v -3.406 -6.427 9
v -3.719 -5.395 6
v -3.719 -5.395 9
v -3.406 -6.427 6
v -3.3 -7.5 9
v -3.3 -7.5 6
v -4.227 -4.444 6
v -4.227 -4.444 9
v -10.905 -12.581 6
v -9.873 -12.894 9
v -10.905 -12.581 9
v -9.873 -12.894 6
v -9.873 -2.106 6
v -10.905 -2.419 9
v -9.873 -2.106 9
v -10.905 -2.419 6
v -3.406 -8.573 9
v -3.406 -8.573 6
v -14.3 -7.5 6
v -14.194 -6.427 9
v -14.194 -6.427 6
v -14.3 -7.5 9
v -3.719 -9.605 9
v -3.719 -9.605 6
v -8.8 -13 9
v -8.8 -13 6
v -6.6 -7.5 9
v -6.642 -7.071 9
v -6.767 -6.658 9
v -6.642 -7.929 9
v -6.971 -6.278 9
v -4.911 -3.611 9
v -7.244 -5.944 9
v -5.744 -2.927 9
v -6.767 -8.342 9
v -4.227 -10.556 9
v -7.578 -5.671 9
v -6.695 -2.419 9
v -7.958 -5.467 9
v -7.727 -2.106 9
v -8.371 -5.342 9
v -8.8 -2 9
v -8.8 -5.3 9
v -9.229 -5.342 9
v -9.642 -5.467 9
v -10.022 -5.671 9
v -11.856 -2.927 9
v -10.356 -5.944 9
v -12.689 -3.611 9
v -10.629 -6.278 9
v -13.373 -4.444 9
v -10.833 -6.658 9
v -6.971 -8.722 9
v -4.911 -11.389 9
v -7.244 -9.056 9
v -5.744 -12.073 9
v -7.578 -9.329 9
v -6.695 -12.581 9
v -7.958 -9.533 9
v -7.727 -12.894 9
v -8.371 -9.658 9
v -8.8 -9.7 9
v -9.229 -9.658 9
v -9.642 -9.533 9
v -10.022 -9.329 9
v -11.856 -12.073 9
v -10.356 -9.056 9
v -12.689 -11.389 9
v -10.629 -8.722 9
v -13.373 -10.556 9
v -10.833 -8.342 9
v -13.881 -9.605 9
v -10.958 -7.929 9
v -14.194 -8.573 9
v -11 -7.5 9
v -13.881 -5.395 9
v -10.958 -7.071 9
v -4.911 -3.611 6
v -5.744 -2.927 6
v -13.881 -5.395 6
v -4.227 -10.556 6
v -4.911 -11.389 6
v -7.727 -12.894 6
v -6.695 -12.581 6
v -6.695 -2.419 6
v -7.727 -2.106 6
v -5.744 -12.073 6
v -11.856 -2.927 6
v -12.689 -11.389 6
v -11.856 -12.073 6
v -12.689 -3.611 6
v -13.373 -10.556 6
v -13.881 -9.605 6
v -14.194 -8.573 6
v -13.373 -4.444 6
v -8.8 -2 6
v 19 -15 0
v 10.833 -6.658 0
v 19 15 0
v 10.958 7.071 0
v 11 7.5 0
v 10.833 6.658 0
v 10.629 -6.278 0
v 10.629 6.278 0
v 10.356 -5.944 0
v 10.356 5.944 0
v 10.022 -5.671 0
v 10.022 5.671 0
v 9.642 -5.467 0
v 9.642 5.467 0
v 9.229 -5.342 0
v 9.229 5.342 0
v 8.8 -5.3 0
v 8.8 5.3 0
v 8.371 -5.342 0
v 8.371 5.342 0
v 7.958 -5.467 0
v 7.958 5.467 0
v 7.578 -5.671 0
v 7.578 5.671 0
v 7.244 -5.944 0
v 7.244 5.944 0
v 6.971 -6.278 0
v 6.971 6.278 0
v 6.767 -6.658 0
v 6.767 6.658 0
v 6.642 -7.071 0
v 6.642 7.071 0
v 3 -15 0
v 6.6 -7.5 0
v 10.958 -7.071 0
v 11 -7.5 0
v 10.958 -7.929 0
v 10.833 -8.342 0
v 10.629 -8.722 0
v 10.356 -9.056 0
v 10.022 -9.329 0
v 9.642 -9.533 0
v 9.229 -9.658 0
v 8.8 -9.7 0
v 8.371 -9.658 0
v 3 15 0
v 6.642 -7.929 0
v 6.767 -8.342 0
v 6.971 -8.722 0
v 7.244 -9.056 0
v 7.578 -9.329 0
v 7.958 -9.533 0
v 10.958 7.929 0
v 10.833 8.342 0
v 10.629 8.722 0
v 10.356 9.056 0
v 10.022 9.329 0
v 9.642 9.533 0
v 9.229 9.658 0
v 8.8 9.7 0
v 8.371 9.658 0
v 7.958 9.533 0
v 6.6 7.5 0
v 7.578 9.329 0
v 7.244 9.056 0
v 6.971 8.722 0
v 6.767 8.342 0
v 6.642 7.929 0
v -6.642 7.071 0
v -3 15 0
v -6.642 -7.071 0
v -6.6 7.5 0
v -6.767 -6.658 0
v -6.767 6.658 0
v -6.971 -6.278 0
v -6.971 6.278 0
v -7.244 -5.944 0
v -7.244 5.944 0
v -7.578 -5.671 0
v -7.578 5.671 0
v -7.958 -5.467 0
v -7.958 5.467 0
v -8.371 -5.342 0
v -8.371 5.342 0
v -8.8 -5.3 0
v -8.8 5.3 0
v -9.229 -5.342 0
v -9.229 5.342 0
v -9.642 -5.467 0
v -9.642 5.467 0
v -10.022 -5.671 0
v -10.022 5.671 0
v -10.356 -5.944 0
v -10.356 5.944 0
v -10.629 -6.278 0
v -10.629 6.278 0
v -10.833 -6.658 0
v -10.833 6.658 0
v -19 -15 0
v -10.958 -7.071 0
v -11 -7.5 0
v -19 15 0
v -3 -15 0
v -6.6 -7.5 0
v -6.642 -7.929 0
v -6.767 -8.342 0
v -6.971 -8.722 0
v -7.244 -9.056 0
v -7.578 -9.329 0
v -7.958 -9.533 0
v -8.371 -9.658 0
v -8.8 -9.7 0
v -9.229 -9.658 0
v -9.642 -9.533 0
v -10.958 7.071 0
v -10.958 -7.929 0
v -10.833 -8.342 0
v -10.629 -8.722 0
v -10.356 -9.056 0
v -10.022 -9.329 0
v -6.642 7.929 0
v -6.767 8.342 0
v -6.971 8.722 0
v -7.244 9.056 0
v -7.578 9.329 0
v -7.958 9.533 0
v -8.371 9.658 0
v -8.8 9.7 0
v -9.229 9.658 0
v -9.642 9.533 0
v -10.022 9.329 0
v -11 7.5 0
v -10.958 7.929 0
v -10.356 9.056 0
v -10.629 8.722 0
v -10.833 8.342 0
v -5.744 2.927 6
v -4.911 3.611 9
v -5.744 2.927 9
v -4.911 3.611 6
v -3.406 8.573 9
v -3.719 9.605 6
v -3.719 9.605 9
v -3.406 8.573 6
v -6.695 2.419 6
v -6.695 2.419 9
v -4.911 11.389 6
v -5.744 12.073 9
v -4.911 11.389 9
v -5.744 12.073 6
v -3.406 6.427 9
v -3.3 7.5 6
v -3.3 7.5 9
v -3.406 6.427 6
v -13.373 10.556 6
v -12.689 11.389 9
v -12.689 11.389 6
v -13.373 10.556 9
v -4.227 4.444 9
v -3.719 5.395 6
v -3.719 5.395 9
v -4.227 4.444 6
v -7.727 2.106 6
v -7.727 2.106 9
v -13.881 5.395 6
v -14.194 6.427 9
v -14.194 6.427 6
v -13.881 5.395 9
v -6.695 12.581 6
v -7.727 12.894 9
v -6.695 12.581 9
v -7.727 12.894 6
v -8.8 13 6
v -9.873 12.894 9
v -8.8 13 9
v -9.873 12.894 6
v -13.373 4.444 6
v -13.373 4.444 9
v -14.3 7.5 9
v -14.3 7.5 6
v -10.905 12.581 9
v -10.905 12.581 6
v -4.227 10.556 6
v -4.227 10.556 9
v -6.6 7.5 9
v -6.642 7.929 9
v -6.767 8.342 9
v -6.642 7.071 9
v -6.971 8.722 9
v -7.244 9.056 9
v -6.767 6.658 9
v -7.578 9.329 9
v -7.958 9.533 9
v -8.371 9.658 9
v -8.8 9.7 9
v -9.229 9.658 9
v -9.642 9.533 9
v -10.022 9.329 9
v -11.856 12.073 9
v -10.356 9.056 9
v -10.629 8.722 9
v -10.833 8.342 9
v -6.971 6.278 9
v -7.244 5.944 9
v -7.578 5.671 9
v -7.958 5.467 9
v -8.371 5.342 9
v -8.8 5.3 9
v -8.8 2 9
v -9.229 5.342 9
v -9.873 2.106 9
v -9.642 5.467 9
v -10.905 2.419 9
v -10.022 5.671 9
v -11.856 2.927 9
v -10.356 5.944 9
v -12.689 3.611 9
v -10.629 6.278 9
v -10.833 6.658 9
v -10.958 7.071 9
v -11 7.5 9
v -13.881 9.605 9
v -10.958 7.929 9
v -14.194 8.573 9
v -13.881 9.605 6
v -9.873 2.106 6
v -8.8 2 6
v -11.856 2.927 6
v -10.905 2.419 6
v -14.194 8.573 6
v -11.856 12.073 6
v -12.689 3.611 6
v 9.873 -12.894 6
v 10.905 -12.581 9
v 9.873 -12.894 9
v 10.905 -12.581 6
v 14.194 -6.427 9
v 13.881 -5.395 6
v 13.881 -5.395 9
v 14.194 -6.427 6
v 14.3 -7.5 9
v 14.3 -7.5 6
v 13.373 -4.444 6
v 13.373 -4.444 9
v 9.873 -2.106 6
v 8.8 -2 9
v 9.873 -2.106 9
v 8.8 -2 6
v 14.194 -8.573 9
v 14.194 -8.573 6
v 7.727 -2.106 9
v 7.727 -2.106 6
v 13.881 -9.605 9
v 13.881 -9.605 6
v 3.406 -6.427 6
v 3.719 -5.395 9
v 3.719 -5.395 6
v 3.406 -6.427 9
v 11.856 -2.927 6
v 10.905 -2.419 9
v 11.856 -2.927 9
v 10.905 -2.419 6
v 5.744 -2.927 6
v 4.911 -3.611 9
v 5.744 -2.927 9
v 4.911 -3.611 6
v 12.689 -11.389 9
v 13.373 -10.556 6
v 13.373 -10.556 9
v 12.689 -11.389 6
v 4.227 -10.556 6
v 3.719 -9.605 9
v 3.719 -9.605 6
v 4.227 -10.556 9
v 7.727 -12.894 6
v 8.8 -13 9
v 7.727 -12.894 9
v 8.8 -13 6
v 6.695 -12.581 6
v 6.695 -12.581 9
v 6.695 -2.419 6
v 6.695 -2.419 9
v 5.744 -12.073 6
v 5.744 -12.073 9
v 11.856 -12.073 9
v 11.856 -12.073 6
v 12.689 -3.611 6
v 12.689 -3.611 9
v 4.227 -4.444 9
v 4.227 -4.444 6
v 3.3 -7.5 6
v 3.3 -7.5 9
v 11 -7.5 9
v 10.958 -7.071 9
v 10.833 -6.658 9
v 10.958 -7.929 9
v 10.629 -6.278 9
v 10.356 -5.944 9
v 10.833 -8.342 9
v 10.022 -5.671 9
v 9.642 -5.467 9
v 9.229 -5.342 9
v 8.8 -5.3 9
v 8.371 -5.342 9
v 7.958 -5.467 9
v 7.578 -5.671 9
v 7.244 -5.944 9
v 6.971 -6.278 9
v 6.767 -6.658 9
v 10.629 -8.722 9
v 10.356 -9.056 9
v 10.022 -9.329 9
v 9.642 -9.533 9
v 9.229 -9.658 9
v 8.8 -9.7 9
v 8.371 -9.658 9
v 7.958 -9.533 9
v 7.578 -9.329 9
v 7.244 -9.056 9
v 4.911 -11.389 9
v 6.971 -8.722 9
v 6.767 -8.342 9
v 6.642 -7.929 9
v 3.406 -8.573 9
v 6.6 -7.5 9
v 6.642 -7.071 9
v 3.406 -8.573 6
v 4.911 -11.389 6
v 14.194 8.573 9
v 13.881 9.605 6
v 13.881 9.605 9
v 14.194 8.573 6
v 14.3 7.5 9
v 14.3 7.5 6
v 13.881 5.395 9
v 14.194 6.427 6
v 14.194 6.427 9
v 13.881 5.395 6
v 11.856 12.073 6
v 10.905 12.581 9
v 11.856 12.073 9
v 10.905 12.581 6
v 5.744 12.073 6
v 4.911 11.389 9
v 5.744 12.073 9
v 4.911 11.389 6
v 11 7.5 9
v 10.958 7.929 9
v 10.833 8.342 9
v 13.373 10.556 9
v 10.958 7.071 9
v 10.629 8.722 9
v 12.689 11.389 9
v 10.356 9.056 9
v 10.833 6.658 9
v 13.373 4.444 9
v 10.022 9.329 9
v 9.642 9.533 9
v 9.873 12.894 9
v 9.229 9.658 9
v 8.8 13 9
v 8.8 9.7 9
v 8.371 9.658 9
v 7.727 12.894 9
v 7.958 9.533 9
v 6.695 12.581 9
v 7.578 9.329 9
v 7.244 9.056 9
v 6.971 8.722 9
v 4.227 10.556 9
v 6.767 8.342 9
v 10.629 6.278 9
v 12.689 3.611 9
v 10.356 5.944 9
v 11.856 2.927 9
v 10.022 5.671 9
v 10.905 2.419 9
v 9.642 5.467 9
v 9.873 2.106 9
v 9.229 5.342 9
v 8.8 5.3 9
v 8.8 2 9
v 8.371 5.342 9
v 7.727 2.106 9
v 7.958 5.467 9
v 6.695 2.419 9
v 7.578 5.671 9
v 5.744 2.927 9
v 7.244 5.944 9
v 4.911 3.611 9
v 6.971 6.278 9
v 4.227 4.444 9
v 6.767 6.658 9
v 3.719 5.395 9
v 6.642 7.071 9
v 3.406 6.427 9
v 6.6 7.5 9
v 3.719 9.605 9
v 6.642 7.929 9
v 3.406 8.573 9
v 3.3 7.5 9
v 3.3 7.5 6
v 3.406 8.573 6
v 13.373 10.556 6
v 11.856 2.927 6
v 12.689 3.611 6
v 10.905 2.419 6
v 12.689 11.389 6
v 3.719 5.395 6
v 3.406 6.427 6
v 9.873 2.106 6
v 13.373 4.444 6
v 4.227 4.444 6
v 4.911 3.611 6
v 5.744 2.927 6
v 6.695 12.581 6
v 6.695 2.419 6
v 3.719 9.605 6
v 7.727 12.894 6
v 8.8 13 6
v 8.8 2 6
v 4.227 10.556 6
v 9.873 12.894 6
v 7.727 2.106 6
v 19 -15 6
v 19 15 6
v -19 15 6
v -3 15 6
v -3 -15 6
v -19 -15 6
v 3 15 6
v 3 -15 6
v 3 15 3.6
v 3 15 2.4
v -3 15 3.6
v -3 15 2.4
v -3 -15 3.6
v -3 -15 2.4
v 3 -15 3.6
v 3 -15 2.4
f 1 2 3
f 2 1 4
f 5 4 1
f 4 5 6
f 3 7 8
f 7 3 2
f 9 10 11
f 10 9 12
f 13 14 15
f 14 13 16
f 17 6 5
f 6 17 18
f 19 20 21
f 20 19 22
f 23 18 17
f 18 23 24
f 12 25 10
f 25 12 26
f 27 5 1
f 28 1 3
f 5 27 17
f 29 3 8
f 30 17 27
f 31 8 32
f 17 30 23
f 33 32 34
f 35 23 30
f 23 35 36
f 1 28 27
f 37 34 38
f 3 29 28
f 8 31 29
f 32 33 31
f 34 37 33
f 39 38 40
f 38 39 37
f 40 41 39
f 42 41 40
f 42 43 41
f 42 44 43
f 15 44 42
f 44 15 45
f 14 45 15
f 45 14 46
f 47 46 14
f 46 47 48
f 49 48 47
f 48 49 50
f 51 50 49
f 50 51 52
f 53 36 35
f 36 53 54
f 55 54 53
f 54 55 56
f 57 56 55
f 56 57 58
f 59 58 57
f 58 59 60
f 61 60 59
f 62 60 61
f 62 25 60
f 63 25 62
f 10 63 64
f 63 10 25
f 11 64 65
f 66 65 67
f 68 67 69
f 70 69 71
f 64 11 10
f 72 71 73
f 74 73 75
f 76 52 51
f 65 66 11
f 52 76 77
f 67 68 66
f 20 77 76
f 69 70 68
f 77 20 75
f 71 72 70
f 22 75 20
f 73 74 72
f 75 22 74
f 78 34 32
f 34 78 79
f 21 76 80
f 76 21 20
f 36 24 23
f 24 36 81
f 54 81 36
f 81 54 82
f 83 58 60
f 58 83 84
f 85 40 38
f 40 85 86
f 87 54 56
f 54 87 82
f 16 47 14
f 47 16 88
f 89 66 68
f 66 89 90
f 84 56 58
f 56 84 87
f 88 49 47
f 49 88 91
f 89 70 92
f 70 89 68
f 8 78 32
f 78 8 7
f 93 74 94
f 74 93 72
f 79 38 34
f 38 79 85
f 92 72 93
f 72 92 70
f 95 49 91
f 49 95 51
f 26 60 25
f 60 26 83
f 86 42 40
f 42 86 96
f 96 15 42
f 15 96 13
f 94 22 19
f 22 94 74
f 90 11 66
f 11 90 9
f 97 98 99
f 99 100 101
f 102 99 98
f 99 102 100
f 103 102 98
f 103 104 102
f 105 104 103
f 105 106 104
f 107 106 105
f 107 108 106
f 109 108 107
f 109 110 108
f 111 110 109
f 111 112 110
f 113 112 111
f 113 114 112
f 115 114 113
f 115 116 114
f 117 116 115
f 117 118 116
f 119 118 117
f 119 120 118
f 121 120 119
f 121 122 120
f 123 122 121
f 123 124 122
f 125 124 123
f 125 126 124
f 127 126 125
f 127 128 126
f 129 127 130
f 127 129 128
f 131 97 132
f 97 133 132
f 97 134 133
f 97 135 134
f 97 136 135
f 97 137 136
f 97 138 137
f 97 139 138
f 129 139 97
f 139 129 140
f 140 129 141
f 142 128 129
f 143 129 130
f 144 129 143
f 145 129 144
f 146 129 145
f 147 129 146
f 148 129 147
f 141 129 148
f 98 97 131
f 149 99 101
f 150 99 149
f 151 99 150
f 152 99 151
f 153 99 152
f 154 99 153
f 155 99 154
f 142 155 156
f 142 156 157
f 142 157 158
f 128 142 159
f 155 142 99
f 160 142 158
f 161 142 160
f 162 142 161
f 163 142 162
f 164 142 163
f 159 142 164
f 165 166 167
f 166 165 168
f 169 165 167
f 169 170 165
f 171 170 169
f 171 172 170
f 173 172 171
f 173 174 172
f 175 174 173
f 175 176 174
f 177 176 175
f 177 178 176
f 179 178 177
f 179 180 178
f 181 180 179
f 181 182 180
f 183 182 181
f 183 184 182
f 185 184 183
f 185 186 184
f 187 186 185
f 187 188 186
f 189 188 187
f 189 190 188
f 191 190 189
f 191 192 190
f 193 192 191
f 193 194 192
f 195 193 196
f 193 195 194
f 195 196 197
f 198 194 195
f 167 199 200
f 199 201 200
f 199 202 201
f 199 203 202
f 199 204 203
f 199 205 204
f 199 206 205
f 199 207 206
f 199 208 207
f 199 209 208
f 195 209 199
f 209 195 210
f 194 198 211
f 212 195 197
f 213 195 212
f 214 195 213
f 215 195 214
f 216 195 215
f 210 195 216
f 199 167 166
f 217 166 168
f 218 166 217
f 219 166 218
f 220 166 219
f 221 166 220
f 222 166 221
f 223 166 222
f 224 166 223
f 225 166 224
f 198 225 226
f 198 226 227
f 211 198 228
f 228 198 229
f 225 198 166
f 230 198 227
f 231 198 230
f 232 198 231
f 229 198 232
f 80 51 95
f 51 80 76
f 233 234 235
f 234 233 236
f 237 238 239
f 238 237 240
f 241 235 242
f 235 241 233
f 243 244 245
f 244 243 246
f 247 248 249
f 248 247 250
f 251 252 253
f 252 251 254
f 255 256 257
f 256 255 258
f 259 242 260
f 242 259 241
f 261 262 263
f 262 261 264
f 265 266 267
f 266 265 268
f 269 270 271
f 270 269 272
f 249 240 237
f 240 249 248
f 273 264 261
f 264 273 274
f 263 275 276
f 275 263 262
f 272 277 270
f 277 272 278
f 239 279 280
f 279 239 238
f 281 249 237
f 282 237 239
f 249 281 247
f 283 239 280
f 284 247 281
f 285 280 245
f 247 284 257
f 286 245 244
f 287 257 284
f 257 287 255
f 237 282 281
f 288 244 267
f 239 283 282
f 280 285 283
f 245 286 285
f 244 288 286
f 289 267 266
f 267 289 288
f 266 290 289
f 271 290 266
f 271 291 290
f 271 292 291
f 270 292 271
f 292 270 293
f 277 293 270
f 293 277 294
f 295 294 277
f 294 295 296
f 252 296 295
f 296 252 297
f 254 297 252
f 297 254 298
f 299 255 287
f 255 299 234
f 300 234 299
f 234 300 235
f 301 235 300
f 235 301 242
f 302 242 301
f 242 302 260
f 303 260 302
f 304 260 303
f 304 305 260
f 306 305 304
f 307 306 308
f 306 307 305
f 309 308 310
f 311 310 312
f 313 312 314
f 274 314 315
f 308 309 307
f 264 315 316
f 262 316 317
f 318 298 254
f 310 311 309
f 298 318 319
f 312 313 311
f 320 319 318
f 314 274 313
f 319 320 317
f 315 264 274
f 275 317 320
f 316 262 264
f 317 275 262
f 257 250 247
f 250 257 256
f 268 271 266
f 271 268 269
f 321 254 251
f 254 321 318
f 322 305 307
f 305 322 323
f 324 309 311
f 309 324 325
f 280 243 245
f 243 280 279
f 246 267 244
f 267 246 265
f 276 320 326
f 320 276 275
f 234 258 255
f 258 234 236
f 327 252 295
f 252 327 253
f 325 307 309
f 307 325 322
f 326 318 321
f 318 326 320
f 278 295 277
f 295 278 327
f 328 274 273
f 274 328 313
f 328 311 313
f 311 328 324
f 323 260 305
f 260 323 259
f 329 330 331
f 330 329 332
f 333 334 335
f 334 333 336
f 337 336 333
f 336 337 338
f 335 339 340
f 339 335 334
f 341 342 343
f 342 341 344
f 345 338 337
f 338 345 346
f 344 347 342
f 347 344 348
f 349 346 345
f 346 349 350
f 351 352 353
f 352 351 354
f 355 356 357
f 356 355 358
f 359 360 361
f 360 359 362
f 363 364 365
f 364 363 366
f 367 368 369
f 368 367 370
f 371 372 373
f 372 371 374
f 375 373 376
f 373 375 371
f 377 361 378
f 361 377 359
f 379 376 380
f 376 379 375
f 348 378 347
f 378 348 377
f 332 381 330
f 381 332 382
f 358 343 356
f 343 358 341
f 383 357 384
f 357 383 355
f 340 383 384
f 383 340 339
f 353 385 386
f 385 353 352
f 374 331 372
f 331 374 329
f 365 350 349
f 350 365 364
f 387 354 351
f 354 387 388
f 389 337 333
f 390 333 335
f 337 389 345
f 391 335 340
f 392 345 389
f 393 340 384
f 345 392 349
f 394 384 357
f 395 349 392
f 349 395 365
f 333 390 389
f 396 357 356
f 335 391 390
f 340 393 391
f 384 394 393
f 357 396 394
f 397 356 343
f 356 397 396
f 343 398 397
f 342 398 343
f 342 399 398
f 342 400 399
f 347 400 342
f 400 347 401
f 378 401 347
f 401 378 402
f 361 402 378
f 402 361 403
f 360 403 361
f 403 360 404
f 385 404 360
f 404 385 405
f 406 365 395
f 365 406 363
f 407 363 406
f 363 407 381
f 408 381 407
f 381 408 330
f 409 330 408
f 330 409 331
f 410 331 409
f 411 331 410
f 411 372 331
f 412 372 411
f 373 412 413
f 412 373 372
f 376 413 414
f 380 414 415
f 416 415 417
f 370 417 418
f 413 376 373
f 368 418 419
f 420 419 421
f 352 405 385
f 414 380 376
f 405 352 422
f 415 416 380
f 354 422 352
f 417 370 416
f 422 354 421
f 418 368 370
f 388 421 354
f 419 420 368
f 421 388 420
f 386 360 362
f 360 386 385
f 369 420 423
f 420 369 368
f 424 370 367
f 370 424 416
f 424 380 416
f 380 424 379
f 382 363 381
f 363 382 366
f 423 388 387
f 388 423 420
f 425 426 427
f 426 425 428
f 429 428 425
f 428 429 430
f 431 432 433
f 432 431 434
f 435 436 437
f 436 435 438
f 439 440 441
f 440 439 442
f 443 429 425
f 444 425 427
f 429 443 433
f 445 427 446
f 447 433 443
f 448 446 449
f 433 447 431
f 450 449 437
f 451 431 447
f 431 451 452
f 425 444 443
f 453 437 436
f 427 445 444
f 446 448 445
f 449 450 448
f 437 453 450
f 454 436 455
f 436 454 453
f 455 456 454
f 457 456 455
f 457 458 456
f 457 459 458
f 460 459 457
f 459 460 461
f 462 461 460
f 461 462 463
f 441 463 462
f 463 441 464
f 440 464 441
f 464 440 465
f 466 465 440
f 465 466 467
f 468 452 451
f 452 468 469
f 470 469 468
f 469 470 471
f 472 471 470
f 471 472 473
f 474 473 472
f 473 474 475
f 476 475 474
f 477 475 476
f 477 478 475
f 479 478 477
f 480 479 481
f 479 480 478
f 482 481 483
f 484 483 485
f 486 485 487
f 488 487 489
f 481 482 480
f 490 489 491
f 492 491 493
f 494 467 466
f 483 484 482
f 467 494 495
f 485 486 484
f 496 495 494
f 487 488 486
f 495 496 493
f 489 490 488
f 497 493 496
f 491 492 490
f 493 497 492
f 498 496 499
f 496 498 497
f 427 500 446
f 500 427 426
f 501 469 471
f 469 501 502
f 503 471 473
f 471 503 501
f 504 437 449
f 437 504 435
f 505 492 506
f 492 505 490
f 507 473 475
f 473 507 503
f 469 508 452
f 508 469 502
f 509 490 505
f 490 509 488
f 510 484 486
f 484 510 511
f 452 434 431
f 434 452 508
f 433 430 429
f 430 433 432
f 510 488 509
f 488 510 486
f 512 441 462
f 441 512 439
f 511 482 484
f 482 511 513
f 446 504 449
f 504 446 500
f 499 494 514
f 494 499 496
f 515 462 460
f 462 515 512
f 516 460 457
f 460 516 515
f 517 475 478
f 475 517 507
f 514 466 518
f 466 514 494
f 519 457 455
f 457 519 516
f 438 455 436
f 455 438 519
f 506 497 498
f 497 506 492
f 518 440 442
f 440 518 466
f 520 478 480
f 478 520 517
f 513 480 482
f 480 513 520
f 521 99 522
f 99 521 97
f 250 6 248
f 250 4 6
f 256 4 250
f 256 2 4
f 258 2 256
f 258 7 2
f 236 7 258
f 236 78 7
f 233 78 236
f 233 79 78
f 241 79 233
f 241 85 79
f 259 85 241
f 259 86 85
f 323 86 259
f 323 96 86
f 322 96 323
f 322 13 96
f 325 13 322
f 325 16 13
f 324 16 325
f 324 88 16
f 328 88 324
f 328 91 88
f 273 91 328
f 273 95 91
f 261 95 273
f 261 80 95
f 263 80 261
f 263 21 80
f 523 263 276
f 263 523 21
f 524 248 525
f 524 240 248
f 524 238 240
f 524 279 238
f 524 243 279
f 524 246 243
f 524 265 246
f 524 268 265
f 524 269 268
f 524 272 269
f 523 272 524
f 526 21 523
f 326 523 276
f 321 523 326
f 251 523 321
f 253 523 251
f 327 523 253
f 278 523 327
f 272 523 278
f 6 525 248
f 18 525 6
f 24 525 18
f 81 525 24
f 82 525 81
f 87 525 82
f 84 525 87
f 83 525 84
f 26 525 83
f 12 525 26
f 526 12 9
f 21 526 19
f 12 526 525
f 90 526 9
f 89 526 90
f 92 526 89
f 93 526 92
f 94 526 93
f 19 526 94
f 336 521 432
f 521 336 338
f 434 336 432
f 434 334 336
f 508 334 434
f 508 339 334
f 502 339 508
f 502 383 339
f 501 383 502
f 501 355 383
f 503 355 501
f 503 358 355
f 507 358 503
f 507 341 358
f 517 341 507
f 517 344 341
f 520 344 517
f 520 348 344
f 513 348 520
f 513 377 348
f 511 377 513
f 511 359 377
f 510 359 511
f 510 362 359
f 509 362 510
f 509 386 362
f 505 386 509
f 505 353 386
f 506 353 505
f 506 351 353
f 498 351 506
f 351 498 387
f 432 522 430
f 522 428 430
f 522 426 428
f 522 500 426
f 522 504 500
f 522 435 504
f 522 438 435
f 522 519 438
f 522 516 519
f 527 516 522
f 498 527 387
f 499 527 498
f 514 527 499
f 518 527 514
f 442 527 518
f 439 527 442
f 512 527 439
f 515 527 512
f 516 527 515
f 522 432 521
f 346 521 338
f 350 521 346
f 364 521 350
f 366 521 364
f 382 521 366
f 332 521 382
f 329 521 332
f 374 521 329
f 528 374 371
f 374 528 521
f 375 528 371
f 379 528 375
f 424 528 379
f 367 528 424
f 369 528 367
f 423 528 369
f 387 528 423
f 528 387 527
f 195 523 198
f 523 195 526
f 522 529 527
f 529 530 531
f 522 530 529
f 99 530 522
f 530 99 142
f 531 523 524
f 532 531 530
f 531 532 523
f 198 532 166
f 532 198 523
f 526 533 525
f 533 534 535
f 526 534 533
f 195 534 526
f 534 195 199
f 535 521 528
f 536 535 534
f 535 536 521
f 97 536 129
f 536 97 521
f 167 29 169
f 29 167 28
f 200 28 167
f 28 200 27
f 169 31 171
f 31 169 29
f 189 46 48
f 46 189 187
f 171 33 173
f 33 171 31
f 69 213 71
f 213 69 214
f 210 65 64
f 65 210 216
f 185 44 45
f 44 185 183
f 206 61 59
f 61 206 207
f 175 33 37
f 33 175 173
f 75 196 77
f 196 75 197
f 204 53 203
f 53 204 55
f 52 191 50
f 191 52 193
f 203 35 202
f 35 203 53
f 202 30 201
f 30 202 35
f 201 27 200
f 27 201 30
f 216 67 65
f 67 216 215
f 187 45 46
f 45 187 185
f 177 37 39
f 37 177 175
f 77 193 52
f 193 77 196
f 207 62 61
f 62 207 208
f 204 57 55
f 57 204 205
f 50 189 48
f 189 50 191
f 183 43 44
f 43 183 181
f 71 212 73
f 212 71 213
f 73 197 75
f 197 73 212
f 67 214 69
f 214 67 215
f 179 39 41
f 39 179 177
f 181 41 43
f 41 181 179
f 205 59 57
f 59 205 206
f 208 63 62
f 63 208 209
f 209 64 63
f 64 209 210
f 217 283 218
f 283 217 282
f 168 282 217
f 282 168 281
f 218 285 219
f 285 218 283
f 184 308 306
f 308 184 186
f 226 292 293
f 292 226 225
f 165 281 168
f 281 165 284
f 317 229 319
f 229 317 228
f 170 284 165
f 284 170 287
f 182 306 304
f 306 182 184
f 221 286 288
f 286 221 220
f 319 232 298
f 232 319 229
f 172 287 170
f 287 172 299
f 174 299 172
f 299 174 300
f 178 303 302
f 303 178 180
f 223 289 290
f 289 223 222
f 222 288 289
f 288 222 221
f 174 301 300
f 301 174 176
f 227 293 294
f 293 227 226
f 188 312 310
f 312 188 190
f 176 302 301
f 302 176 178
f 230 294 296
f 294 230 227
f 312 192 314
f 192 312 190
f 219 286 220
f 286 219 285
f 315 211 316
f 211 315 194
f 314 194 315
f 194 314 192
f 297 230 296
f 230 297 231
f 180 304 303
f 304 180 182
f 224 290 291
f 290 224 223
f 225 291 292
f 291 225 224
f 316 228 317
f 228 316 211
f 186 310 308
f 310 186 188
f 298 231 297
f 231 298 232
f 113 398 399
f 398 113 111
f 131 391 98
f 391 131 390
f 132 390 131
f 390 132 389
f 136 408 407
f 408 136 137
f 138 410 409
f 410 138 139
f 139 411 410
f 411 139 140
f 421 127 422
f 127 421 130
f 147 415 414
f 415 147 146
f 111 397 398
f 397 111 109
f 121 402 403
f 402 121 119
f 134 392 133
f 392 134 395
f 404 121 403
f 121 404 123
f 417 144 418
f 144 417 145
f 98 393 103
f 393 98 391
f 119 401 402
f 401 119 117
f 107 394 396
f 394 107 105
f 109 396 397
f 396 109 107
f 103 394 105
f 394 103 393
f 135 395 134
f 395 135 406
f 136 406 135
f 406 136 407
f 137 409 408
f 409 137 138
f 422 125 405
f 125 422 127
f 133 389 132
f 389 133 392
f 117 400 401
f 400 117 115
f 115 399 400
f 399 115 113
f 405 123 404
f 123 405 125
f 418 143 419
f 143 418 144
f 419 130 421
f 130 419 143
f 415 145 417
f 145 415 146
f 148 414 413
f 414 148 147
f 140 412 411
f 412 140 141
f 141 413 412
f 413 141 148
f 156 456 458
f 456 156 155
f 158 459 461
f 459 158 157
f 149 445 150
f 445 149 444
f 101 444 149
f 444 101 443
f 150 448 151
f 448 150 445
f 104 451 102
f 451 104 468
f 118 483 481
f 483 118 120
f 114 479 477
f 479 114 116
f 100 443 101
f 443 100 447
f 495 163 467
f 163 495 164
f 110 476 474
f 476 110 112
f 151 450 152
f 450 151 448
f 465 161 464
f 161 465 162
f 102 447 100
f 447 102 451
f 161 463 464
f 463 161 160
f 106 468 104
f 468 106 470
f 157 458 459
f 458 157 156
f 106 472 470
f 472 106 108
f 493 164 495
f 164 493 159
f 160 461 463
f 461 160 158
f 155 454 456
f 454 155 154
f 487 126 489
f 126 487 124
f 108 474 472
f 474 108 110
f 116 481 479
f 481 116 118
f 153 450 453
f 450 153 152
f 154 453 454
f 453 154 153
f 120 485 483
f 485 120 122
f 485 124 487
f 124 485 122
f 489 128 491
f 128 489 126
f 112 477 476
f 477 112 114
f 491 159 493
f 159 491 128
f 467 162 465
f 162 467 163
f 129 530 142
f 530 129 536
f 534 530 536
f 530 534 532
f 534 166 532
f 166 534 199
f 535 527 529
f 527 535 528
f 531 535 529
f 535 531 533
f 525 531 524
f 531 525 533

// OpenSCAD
$fn = 32;

// ----------------------------------------------------------------------
// Living hinge: 38 x 30 mm plates, 1.2 mm flexible web
// ----------------------------------------------------------------------

// --- parameters (mm) ---
plate_len = 16;           // plate length outside the web
plate_w = 30;             // plate width
thick = 6;                // plate thickness
web_half = 3;             // half width of the flex band
web_t = 1.2;              // flexible web thickness
web_z = 2.4;              // web position inside the thickness
boss_d = 11;              // screw boss diameter
boss_h = 9;               // screw boss height
boss_x = 8.8;             // screw boss distance from the web
screw_d = 4.4;            // screw hole

difference() {
  union() {
    /* one flat strip, later thinned at the middle */
    translate([-19, -15, 0]) cube([38, 30, 6]);
    /* screw bosses, sunk 0.5 mm into the plates */
    for (sx = [-8.8, 8.8]) {
      for (sy = [-7.5, 7.5]) {
        translate([sx, sy, 0]) cylinder(h = boss_h, d = boss_d);
      }
    }
  }
  /* channel from below: leaves the web on top of it */
  translate([-3, -17.5, -2.5]) cube([6, 35, 4.9]);
  /* channel from above: thins the web down to web_t */
  translate([-3, -17.5, 3.6]) cube([6, 35, 4.9]);
  /* screw holes through the bosses */
  for (sx = [-8.8, 8.8]) {
    for (sy = [-7.5, 7.5]) {
      translate([sx, sy, -2.5]) cylinder(h = boss_h + 5, d = screw_d);
    }
  }
}
